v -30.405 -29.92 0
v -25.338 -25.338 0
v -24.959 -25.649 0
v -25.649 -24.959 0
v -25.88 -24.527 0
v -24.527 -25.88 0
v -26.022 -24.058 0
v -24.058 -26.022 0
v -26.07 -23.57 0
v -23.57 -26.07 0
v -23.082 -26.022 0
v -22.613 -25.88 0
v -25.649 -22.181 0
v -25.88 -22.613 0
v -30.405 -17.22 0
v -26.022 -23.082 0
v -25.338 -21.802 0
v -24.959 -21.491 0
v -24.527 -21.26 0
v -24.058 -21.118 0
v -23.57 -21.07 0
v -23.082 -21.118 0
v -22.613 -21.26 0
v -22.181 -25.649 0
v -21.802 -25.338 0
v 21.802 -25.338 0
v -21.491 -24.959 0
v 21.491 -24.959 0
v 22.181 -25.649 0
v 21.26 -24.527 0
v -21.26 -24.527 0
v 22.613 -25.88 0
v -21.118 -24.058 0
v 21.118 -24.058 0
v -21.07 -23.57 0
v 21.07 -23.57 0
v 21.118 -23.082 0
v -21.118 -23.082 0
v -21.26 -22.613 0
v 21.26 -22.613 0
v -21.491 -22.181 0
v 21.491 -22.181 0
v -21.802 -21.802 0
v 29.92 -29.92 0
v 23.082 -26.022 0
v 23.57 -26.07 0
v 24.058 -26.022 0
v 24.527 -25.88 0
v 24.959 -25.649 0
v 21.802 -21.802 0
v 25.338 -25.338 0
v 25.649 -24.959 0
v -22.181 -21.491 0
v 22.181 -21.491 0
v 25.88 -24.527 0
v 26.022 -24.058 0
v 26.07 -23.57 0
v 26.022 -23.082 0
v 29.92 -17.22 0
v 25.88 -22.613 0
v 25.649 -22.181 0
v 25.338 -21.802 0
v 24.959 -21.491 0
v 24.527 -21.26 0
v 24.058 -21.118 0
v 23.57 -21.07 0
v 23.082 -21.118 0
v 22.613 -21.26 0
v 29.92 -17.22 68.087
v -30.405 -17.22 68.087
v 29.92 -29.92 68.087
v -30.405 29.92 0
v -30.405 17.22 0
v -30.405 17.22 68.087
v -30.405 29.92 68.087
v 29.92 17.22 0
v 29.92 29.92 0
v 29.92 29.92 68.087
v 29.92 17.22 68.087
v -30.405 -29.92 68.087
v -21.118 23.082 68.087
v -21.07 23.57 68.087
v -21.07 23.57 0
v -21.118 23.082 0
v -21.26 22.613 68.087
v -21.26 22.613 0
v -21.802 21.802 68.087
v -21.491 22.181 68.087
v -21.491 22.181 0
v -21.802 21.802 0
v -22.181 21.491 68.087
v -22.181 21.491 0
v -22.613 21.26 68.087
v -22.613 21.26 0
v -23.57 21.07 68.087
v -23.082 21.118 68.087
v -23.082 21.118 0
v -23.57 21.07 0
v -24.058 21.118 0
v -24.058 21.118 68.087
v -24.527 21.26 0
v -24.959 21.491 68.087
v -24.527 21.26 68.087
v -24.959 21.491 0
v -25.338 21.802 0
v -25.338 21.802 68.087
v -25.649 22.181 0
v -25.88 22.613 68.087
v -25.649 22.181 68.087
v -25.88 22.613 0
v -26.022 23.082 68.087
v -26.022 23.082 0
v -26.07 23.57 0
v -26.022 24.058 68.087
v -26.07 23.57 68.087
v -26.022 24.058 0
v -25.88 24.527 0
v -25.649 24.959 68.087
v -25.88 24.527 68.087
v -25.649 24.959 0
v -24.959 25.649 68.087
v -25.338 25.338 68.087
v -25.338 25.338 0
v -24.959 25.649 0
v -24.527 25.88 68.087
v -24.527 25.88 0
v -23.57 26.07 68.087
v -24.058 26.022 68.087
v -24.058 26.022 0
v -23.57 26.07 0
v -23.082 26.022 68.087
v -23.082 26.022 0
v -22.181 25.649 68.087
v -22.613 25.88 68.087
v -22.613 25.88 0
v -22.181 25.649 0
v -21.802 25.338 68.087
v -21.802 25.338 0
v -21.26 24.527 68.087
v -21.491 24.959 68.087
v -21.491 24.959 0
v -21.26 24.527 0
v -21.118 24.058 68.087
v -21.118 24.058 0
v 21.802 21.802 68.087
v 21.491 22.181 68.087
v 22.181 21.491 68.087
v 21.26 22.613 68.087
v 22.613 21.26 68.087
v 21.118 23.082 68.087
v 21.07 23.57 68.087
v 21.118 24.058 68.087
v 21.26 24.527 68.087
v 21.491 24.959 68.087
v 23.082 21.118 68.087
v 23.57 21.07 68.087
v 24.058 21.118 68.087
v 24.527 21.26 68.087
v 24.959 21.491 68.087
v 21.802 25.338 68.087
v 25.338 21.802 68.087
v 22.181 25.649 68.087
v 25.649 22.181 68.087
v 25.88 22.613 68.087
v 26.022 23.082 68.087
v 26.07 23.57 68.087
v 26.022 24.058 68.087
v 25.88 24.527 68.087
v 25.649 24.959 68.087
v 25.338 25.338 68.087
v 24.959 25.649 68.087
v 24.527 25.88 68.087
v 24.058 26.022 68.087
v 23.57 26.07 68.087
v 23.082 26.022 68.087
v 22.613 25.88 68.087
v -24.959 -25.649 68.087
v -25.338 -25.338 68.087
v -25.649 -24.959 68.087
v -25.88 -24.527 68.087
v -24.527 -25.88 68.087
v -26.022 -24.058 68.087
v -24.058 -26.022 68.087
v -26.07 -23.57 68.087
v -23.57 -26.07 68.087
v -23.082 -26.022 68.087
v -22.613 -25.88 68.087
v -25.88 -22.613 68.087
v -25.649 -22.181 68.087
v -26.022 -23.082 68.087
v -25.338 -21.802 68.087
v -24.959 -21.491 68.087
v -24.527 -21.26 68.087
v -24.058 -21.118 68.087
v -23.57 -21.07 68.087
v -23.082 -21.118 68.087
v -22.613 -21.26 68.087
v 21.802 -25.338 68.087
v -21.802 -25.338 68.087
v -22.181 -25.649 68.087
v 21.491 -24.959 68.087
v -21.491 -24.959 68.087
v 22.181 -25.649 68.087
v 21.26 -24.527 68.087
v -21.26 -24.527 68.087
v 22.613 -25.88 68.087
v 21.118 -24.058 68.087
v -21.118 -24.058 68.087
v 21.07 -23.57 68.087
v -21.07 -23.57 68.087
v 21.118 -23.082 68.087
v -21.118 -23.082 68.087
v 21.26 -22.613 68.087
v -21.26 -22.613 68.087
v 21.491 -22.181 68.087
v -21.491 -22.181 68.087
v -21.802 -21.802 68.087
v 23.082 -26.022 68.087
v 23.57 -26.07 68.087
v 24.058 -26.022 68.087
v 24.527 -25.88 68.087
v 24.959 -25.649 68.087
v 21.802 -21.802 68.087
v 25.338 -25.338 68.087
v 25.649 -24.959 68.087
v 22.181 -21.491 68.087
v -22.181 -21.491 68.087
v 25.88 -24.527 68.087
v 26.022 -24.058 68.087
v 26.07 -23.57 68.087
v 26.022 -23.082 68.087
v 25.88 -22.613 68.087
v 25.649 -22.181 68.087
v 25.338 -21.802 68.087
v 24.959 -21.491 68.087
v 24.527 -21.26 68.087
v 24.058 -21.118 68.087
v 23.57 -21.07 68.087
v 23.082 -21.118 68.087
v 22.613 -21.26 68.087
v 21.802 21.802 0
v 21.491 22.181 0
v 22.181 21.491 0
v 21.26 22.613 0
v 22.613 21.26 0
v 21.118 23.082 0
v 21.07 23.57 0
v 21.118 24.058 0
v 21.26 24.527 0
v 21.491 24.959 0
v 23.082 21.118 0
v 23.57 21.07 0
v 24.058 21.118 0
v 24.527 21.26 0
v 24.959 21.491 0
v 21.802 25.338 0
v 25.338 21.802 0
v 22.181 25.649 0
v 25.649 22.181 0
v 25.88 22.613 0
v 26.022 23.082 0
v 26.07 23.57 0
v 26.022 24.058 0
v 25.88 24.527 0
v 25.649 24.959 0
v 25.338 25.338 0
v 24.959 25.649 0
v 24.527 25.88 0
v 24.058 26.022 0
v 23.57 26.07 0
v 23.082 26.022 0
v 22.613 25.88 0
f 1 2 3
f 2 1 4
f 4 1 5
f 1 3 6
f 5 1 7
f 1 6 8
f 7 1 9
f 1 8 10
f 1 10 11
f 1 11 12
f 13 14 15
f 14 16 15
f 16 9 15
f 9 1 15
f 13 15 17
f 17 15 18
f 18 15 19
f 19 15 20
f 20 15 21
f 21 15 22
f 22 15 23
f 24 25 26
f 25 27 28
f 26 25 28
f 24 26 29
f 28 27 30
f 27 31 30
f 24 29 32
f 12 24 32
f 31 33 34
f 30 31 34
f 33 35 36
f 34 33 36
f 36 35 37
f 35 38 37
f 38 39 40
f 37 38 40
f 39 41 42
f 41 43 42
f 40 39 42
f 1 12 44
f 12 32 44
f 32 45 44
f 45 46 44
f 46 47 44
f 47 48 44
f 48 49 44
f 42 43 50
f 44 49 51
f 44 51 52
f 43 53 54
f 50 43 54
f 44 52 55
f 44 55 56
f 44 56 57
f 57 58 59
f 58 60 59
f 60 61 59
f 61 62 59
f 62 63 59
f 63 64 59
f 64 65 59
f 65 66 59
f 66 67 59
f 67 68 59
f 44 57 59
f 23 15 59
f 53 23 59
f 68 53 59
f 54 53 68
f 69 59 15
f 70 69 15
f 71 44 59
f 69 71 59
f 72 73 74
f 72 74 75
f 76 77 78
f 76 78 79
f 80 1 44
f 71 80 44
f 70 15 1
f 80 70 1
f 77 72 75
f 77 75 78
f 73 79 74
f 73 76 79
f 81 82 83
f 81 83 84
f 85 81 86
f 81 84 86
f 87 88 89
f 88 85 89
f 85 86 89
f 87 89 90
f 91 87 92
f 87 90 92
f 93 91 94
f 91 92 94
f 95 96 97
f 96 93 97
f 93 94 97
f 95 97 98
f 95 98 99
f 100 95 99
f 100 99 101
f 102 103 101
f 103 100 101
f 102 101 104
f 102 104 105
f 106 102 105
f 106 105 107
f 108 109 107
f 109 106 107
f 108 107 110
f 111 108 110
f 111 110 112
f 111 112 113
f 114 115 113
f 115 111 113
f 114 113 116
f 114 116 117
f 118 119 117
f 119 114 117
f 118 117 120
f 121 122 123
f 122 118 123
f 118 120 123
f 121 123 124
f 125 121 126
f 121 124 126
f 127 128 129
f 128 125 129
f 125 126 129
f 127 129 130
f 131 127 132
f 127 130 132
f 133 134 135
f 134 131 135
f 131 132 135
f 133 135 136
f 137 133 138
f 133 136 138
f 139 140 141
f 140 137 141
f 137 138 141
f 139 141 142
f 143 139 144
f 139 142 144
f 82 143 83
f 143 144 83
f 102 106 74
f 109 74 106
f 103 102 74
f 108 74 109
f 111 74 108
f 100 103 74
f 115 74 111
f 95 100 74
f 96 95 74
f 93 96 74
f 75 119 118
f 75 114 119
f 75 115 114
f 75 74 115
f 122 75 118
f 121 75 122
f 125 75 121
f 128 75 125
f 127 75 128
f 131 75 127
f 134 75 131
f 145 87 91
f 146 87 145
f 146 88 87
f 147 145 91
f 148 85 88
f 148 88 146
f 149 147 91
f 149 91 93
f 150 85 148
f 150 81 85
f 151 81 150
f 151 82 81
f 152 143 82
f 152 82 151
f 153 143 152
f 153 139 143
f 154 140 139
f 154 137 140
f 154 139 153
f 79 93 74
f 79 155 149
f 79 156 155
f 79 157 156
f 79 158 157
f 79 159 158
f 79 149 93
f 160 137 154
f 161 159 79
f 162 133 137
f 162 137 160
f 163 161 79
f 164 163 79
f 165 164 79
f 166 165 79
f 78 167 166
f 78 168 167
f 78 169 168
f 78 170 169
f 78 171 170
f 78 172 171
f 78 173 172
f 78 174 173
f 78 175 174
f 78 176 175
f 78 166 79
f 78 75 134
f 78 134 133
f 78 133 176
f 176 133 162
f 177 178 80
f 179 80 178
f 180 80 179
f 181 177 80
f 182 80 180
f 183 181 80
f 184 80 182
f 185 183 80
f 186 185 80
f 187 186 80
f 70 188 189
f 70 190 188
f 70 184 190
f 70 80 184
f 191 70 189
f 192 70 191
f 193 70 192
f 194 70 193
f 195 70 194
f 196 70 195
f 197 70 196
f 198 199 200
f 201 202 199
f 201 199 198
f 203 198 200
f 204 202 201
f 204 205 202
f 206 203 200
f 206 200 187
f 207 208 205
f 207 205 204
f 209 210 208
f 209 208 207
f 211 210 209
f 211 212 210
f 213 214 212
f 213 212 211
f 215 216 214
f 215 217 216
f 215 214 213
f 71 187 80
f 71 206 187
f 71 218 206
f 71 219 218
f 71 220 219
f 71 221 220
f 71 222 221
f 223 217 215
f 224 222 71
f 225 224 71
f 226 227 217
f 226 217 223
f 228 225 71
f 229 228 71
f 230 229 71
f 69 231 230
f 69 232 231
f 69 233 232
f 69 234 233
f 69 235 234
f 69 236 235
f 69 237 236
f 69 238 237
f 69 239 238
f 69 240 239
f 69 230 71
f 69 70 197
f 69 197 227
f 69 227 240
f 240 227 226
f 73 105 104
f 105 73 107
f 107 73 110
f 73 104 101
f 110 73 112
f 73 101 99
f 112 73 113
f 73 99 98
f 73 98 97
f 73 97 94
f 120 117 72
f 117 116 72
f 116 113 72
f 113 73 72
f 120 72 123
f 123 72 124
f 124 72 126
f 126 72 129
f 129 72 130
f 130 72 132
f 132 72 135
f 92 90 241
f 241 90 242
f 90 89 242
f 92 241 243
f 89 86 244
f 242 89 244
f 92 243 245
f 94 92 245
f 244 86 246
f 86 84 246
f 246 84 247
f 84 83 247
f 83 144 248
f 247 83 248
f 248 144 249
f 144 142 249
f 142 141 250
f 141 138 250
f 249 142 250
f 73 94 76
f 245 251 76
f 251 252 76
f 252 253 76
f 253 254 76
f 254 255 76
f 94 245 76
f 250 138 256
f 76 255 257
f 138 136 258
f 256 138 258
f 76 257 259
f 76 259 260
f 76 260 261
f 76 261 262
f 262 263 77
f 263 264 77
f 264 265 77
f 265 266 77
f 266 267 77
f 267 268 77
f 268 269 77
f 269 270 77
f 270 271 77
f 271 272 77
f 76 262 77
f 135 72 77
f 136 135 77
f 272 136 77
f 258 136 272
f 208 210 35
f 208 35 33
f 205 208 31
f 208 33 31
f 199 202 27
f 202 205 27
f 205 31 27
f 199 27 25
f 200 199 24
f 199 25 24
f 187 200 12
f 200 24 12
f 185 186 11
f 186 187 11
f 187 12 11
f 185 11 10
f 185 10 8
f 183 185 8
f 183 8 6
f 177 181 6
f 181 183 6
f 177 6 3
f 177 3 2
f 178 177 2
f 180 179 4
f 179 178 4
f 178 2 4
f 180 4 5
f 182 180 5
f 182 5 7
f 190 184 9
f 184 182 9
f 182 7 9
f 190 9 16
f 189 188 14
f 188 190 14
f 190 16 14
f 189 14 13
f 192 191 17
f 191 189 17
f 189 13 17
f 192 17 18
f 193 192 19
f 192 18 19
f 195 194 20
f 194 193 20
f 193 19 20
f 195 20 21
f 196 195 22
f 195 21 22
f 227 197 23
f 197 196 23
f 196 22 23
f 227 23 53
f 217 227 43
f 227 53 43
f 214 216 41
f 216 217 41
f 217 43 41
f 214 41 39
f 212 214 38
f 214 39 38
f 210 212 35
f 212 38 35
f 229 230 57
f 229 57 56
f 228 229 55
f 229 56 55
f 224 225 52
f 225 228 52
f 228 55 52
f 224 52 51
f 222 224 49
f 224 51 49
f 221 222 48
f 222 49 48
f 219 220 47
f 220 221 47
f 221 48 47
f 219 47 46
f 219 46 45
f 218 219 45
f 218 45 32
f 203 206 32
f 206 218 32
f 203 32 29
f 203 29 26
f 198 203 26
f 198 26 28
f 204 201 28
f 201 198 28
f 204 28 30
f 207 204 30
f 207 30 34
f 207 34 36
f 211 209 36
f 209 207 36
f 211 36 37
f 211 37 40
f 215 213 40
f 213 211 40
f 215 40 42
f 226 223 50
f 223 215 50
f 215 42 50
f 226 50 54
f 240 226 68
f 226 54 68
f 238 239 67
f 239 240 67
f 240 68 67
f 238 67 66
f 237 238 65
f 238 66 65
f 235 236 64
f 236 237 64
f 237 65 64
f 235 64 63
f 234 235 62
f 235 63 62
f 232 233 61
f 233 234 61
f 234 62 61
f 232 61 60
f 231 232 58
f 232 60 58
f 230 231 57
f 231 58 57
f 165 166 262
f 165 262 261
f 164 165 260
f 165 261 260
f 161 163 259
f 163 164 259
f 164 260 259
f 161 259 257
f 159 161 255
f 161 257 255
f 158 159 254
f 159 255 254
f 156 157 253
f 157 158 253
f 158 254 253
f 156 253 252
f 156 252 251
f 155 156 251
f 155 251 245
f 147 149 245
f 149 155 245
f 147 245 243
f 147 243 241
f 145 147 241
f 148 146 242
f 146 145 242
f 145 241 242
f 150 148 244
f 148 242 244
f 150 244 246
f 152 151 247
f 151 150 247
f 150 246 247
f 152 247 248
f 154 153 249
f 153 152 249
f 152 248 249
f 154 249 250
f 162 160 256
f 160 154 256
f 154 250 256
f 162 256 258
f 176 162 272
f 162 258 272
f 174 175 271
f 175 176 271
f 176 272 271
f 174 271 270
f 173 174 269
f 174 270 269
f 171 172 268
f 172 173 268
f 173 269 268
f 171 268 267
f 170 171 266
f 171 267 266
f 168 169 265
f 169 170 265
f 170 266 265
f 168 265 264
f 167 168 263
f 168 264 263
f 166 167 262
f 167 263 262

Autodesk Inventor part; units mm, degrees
ref_plane "YZ Plane" through (0, 0, 0) normal (1, 0, 0) x (0, 1, 0)
ref_plane "XZ Plane" through (0, 0, 0) normal (0, 1, 0) x (-1, 0, 0)
sketch "Sketch1" plane through (0, 0, 0) normal (0, 0, 1) x (1, 0, 0)
  circle A0 centre (23.57, 23.57) radius 2.5 projected
  circle A1 centre (23.57, -23.57) radius 2.5 projected
  circle A2 centre (-23.57, -23.57) radius 2.5 projected
  circle A3 centre (-23.57, 23.57) radius 2.5 projected
  arc A4 (8.76, 9.1953) -> (9.467, 8.4656) centre (0, 0) ccw projected
  arc A5 (10.897, -6.5227) -> (11.0973, 6.1758) centre (0, 0) ccw projected
  circle A6 centre (0, 0) radius 15.875
  line L0 (-30.405, 29.92) -> (29.92, 29.92)
  line L1 (29.92, 29.92) -> (29.92, 17.22)
  line L2 (29.92, 17.22) -> (-30.405, 17.22)
  line L3 (-30.405, 17.22) -> (-30.405, 29.92)
  line L4 (23.57, 23.57) -> (23.57, -23.57) construction
  line L5 (-23.57, -23.57) -> (-23.57, 23.57) construction
  line L6 (23.57, 0) -> (-23.57, 0) construction
  line L7 (-30.405, -29.92) -> (29.92, -29.92)
  line L8 (29.92, -29.92) -> (29.92, -17.22)
  line L9 (29.92, -17.22) -> (-30.405, -17.22)
  line L10 (-30.405, -17.22) -> (-30.405, -29.92)
  point P0 (0, 0)
  dimension "d0" = 31.75
  dimension "d1" = 6.35
  dimension "d2" = 6.35
  dimension "d3" = 60.325
  dimension "d4" = 6.35
ref_plane "Work Plane1" through (-28.3245, -28.3245, 68.0874) normal (0, 0, -1) x (0, 1, 0)
extrude "Extrusion1" add sketch "Sketch1" along normal up to surface (68.0874 mm away) contours L0 L1 L2 L3 | L10 L9 L8 L7
properties part number "Stepper Spacer Y"
